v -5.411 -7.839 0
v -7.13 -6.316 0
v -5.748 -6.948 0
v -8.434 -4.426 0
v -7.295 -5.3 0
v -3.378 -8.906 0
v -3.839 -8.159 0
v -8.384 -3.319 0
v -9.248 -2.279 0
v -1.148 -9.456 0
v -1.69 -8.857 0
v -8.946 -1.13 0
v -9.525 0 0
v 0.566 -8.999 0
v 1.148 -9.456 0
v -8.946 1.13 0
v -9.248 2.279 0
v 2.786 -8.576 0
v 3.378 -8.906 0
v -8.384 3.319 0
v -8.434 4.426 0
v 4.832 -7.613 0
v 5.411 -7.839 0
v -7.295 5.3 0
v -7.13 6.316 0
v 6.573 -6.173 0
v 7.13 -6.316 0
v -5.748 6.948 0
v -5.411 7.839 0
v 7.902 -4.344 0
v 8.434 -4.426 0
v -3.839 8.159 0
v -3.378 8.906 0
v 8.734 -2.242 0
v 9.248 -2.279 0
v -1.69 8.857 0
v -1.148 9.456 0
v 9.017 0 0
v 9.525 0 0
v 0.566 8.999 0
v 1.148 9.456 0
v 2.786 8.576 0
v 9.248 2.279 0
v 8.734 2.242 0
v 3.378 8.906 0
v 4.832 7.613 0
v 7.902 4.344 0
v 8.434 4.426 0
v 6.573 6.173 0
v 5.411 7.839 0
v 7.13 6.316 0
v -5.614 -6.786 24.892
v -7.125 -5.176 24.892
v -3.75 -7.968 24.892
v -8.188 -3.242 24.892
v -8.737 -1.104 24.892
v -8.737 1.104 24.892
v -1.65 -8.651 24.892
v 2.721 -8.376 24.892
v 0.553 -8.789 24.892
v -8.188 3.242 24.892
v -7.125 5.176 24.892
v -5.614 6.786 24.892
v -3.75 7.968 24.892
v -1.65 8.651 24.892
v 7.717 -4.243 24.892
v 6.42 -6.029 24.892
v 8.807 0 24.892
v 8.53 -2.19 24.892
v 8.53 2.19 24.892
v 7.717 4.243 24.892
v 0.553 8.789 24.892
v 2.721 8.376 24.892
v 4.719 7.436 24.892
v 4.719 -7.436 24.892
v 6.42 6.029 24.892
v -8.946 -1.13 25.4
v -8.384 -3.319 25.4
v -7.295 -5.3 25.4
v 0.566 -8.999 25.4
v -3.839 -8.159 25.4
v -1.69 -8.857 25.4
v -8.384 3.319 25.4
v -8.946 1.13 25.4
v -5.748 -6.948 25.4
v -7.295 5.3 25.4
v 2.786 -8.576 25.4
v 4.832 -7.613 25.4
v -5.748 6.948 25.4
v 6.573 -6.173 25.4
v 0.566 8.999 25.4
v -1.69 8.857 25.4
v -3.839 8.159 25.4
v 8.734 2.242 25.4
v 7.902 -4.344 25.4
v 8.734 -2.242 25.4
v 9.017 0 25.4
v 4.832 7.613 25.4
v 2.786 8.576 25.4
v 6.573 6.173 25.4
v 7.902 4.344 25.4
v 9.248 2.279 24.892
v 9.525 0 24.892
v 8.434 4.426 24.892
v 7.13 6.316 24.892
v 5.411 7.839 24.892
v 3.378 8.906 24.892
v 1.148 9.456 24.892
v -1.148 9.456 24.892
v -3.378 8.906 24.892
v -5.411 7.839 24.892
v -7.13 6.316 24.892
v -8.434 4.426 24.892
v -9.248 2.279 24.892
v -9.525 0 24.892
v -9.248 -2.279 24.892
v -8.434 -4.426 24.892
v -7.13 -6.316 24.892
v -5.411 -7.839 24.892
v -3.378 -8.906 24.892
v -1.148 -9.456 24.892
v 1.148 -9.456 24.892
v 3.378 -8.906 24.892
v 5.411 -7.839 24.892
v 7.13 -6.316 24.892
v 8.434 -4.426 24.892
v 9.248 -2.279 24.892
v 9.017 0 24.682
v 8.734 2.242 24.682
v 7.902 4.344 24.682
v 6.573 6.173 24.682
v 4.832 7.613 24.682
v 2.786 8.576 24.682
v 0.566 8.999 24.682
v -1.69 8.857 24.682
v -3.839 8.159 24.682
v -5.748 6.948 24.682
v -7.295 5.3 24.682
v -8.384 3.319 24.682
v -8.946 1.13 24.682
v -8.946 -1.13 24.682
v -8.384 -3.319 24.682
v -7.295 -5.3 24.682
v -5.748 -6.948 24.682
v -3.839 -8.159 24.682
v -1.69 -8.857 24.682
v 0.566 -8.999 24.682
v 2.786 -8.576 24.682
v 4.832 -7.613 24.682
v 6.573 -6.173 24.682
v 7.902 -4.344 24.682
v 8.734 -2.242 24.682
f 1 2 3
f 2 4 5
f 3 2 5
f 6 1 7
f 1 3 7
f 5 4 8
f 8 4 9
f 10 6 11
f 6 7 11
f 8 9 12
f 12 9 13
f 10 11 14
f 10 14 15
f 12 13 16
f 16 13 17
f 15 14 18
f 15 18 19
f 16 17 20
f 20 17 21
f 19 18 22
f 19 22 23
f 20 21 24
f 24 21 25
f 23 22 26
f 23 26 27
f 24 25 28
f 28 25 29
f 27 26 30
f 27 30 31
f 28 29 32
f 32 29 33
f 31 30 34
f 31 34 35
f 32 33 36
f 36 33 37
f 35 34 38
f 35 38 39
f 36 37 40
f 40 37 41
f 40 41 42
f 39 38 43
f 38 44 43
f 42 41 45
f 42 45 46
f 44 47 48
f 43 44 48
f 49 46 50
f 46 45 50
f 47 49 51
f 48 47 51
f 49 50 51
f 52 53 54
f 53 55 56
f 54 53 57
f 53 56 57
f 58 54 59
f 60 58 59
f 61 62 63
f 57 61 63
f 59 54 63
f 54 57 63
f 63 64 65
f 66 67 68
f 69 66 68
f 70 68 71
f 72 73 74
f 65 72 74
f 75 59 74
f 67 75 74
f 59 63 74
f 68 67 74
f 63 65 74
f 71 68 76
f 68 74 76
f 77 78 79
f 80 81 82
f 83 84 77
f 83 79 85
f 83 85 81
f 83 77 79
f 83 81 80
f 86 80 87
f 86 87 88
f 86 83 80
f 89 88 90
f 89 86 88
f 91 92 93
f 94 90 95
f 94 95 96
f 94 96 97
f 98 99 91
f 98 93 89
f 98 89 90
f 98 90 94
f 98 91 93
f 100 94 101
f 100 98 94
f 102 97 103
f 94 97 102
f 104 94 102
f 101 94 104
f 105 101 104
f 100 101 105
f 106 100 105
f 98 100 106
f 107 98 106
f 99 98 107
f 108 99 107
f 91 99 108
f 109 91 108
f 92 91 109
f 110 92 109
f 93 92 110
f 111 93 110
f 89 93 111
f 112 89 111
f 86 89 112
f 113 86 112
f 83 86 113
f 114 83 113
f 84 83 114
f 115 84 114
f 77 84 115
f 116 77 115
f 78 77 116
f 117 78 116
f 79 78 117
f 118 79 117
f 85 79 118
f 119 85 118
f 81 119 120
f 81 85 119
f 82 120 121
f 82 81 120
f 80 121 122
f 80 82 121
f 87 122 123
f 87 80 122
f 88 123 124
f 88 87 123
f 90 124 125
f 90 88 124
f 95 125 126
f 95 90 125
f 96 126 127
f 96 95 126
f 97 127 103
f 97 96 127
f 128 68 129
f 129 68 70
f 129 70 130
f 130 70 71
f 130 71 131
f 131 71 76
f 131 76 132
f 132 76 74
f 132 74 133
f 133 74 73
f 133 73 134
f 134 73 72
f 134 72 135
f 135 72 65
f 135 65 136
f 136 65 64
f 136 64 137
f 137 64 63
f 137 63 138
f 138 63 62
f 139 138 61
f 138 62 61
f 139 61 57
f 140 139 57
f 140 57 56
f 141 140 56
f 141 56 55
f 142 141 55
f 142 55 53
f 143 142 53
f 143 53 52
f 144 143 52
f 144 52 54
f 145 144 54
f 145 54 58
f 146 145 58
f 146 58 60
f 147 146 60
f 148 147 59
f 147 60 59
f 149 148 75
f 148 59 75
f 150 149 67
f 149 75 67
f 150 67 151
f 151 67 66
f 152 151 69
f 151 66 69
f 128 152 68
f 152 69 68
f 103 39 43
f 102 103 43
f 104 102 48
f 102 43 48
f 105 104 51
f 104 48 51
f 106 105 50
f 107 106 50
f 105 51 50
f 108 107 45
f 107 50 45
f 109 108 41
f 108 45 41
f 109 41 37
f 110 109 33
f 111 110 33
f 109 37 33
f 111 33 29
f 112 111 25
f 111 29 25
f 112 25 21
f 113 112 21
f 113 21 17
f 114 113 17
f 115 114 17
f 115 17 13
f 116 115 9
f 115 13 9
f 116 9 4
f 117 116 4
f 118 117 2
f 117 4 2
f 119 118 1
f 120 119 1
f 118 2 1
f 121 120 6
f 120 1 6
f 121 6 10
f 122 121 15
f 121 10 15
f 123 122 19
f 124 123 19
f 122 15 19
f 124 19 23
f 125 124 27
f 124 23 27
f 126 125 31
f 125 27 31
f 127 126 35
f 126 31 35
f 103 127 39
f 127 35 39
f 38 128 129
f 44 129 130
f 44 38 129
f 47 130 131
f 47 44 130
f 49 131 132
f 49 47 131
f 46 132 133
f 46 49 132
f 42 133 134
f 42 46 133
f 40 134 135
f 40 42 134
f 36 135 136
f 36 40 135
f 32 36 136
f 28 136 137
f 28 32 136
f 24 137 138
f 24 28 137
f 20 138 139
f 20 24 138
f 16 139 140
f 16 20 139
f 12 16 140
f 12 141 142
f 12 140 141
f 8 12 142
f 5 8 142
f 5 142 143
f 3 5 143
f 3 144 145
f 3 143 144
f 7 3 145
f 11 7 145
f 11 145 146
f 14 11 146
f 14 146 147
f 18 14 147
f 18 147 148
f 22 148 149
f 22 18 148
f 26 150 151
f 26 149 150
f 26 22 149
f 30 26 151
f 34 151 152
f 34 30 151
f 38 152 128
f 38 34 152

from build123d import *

# Parameters (mm, degrees)
F0_R     = 9.525
F1_DEPTH = 25.4
F2_SIZE  = 0.508
F3_T     = -0.508


with BuildPart() as f1:
    # F0 (on Top) → F1 (new body)
    with BuildSketch(Plane.XY):
        Circle(F0_R)
    extrude(amount=F1_DEPTH)

    # F2
    f2_edges = [f1.edges().sort_by_distance(p)[0] for p in [
        (-9.525, 0, 25.4),
    ]]
    chamfer(f2_edges, length=F2_SIZE)

    # F3
    f3_openings = [f1.faces().sort_by_distance(p)[0] for p in [
        (0, 0, 0),
    ]]
    offset(amount=F3_T, openings=f3_openings)


solid = f1.part
